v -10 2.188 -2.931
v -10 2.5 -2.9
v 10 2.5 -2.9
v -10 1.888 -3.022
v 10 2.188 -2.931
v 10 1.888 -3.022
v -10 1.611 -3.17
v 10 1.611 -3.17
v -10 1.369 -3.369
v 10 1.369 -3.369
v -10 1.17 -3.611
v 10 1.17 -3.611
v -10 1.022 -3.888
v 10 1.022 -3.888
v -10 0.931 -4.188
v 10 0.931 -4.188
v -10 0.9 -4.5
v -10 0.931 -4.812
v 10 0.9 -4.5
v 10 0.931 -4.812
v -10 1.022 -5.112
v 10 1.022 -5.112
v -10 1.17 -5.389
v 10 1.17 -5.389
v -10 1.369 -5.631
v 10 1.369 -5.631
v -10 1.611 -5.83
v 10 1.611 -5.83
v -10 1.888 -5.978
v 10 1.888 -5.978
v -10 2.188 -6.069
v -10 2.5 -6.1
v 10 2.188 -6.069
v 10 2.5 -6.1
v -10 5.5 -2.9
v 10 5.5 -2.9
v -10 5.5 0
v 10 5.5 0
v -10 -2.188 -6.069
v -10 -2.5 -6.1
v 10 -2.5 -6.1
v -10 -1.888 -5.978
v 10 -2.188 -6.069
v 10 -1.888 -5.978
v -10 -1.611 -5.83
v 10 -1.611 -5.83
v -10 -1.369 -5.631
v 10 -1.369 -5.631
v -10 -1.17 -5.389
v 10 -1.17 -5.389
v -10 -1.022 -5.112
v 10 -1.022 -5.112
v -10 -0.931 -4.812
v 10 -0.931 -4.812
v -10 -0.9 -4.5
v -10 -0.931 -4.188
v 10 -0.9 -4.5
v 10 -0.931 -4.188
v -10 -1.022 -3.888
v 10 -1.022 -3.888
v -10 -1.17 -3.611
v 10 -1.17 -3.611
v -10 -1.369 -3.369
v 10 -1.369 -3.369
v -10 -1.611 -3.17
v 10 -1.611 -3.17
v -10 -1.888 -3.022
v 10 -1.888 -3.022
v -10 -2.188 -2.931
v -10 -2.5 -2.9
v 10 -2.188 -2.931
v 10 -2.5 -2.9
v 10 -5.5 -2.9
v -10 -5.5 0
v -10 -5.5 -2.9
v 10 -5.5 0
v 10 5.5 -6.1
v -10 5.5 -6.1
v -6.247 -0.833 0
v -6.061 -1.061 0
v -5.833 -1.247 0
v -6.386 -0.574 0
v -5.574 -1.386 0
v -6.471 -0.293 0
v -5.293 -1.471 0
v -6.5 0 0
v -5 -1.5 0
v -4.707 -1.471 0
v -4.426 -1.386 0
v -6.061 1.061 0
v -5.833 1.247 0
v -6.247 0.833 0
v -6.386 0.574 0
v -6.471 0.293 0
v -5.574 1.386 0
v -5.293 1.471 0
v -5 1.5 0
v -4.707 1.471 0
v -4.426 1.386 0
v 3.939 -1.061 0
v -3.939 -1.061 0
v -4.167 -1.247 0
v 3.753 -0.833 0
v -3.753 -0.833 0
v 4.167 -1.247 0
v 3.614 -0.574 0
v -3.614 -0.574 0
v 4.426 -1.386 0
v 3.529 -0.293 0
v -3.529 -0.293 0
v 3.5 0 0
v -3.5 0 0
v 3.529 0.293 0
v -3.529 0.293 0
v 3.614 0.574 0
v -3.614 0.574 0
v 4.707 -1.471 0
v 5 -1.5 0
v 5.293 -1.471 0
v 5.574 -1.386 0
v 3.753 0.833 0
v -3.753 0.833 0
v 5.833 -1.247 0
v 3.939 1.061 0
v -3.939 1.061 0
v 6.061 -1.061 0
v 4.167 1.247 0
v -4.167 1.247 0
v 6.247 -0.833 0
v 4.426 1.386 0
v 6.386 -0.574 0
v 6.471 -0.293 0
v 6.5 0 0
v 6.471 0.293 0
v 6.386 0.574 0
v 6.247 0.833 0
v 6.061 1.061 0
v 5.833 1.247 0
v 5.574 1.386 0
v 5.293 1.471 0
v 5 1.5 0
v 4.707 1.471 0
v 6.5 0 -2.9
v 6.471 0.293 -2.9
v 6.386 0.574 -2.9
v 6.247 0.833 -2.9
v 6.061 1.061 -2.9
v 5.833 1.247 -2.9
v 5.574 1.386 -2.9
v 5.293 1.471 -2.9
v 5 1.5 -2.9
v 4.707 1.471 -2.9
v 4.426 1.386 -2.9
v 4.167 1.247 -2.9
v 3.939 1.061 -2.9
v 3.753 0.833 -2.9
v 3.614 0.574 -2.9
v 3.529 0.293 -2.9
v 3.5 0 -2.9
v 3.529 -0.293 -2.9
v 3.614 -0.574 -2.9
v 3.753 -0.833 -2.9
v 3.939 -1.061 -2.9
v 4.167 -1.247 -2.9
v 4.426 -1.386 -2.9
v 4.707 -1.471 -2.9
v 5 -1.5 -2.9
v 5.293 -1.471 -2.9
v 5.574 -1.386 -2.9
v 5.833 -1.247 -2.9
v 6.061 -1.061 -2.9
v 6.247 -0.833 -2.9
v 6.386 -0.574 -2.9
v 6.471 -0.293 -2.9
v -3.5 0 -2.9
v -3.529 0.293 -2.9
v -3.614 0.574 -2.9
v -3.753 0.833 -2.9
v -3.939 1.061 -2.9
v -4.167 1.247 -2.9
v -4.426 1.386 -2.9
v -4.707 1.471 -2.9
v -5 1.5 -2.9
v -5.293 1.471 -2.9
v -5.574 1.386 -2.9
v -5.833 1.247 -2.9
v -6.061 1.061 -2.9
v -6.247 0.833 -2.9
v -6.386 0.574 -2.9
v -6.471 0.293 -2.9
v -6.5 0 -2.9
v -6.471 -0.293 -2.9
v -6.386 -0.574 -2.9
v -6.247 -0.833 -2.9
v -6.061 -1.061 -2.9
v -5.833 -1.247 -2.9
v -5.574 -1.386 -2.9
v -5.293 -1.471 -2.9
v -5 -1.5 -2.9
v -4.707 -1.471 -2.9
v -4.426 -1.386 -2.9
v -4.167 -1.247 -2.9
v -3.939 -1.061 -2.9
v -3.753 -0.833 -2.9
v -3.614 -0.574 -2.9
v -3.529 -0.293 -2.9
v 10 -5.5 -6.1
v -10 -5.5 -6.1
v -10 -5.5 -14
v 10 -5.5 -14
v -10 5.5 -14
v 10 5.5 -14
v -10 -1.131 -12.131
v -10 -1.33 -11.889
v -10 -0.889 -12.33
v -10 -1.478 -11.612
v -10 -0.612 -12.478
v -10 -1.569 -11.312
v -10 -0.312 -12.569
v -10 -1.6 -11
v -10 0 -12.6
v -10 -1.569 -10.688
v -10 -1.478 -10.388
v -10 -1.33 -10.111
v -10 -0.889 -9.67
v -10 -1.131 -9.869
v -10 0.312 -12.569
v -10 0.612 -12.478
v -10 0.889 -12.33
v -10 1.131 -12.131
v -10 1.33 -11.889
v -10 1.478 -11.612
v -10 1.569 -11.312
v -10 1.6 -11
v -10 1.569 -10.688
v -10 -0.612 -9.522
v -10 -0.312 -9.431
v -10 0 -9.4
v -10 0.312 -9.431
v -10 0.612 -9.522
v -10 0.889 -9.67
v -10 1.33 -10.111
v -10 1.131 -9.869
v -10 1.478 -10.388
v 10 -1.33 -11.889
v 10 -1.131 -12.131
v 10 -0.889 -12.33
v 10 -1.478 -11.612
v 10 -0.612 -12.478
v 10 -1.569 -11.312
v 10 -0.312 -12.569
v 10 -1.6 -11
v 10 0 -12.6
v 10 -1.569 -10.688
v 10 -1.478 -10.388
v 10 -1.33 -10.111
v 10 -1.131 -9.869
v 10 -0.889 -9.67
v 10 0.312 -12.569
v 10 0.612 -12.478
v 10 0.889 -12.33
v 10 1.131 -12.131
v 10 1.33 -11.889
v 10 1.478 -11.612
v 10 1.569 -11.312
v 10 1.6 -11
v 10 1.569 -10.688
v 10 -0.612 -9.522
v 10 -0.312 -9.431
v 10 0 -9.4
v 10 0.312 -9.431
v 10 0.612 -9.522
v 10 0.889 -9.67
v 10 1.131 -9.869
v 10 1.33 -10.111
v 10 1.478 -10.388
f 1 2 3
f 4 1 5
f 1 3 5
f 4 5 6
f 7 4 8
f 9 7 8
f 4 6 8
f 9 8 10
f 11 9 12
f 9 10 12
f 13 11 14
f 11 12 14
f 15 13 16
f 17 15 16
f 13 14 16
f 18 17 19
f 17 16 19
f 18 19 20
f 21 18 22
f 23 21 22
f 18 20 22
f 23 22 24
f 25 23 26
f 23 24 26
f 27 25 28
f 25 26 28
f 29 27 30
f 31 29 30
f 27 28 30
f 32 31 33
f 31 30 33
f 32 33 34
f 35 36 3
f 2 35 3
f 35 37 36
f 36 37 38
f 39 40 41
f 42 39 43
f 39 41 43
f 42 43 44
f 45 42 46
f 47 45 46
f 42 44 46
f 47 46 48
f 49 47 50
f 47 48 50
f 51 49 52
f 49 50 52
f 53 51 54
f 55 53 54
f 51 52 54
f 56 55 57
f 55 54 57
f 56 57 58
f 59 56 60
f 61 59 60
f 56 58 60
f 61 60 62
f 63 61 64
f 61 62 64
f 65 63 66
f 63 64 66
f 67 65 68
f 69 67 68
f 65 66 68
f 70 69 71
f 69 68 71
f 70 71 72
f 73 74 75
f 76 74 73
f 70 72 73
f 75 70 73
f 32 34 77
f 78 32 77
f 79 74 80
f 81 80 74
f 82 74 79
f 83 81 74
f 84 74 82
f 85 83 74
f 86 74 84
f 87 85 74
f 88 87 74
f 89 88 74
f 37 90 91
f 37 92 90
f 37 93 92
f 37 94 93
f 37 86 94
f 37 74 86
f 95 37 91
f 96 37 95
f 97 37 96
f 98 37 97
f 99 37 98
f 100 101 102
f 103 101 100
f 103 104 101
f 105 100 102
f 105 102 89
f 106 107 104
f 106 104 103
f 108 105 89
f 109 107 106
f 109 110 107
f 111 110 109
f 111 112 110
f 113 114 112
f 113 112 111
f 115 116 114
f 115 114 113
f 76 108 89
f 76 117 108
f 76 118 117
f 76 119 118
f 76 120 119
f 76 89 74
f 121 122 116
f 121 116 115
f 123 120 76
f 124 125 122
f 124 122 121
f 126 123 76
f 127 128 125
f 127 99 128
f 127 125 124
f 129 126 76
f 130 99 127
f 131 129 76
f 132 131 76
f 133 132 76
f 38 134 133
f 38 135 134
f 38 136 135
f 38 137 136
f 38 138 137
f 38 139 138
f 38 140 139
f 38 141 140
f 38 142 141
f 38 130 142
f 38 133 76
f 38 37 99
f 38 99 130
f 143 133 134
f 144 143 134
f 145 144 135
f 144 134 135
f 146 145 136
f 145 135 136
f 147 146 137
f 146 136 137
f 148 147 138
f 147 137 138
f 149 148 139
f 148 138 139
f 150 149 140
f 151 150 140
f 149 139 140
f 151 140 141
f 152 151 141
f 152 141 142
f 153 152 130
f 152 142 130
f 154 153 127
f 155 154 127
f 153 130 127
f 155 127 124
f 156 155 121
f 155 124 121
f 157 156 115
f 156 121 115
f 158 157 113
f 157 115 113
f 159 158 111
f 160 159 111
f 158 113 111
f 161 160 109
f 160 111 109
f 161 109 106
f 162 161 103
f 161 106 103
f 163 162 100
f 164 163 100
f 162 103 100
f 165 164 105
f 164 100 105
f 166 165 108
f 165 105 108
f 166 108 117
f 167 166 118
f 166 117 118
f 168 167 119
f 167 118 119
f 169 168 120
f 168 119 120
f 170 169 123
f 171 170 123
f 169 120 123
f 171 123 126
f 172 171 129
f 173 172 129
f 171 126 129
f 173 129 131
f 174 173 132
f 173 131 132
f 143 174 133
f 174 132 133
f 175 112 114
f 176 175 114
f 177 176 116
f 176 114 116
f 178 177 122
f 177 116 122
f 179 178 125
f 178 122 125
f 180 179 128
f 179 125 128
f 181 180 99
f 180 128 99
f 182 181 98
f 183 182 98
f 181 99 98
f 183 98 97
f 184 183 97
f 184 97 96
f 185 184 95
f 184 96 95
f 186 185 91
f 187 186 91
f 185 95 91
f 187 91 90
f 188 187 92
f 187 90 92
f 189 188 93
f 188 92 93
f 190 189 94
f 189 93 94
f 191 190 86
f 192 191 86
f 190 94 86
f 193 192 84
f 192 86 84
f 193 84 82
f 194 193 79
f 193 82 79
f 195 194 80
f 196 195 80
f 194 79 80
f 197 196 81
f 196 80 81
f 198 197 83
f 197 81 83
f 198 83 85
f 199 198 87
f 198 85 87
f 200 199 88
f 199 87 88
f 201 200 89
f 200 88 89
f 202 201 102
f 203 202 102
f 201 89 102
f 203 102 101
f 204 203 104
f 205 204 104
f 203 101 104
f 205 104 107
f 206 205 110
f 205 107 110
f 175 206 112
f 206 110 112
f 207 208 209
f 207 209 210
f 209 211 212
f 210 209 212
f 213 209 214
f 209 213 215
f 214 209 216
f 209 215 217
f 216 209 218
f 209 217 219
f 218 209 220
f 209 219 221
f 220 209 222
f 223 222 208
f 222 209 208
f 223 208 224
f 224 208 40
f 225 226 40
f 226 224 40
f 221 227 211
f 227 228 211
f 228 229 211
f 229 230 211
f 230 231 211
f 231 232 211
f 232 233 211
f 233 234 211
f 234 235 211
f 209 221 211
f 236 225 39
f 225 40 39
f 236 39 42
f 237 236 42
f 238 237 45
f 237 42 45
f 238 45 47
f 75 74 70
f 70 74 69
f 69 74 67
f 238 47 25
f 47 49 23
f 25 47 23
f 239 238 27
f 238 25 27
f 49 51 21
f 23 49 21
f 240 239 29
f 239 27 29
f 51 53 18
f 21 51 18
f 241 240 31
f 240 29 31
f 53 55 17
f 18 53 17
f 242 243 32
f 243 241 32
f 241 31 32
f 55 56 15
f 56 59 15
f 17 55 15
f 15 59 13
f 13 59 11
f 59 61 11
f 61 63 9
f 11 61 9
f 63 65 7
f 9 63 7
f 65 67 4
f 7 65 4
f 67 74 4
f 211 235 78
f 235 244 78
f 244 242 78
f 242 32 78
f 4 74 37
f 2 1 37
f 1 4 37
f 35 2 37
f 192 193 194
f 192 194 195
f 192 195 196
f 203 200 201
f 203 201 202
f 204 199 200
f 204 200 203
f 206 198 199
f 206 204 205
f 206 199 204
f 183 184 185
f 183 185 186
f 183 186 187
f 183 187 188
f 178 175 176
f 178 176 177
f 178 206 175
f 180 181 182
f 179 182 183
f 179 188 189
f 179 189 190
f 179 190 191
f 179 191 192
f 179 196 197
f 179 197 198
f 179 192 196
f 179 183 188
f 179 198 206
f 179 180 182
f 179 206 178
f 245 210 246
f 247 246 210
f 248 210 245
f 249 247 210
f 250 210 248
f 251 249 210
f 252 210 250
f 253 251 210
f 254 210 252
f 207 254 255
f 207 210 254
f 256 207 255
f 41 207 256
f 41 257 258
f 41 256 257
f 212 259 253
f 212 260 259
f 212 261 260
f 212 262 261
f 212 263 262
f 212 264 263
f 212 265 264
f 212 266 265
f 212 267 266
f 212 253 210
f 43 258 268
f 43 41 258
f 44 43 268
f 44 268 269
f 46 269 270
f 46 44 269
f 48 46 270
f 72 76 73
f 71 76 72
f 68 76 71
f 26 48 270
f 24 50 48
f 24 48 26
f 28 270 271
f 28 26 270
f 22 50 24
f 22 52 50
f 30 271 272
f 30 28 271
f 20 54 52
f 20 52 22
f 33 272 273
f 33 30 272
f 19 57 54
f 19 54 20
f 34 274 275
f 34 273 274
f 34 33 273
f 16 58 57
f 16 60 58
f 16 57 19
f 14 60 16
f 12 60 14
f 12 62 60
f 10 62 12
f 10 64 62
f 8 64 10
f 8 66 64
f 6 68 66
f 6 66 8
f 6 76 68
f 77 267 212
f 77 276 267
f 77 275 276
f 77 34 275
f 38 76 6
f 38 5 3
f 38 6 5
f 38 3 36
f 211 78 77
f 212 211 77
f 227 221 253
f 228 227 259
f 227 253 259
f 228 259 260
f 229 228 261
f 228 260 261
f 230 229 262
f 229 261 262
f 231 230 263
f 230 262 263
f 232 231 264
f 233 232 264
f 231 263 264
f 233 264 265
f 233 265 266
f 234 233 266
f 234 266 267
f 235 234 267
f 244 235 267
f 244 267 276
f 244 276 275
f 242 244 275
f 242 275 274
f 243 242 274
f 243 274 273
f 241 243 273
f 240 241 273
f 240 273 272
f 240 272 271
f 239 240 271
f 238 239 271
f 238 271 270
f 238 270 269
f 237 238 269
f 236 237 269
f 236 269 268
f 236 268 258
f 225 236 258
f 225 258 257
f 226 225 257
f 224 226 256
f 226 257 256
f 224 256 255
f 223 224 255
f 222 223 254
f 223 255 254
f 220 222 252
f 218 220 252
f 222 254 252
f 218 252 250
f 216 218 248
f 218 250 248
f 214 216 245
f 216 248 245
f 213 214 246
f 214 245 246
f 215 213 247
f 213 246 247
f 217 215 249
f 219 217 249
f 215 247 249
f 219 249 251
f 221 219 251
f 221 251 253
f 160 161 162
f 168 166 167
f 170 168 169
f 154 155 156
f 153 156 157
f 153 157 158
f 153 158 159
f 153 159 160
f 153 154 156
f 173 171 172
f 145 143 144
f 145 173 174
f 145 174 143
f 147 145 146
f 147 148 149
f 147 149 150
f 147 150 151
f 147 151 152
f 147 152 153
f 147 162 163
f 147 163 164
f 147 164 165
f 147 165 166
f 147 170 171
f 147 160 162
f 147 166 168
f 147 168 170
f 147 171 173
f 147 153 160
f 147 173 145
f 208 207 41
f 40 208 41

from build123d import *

# Parameters (mm, degrees)
SKETCH_2_W          = 20
SKETCH_2_H          = 11
EXTRUDE_1_DEPTH     = 14
SKETCH_4_R          = 1.6
CUT_EXTRUDE_1_DEPTH = 21
SKETCH_5_R          = 1.5
CUT_EXTRUDE_2_DEPTH = 2.9


with BuildPart() as part:
    # 草图2 → 凸台-拉伸1 (new body)
    with BuildSketch(Plane.XY):
        Rectangle(SKETCH_2_W, SKETCH_2_H)
    extrude(amount=-EXTRUDE_1_DEPTH)

    # 草图4 → 切除-拉伸1 (cut, through all)
    with BuildSketch(Plane(origin=(10, 0, 0), x_dir=(0, 0, -1), z_dir=(1, 0, 0))):
        with BuildLine():
            ThreePointArc((6.1, -2.5), (4.5, -0.9), (2.9, -2.5))
            Line((2.9, -2.5), (2.9, -5.5))
            Line((2.9, -5.5), (6.1, -5.5))
            Line((6.1, -5.5), (6.1, -2.5))
        make_face()
        with BuildLine():
            Line((2.9, 5.5), (2.9, 2.5))
            ThreePointArc((2.9, 2.5), (4.5, 0.9), (6.1, 2.5))
            Line((6.1, 2.5), (6.1, 5.5))
            Line((6.1, 5.5), (2.9, 5.5))
        make_face()
        with Locations((11, 0)):
            Circle(SKETCH_4_R)
    extrude(amount=-CUT_EXTRUDE_1_DEPTH, mode=Mode.SUBTRACT)

    # 草图5 → 切除-拉伸2 (cut)
    with BuildSketch(Plane.XY):
        with Locations((-5, 0)):
            Circle(SKETCH_5_R)
        with Locations((5, 0)):
            Circle(SKETCH_5_R)
    extrude(amount=-CUT_EXTRUDE_2_DEPTH, mode=Mode.SUBTRACT)


solid = part.part
